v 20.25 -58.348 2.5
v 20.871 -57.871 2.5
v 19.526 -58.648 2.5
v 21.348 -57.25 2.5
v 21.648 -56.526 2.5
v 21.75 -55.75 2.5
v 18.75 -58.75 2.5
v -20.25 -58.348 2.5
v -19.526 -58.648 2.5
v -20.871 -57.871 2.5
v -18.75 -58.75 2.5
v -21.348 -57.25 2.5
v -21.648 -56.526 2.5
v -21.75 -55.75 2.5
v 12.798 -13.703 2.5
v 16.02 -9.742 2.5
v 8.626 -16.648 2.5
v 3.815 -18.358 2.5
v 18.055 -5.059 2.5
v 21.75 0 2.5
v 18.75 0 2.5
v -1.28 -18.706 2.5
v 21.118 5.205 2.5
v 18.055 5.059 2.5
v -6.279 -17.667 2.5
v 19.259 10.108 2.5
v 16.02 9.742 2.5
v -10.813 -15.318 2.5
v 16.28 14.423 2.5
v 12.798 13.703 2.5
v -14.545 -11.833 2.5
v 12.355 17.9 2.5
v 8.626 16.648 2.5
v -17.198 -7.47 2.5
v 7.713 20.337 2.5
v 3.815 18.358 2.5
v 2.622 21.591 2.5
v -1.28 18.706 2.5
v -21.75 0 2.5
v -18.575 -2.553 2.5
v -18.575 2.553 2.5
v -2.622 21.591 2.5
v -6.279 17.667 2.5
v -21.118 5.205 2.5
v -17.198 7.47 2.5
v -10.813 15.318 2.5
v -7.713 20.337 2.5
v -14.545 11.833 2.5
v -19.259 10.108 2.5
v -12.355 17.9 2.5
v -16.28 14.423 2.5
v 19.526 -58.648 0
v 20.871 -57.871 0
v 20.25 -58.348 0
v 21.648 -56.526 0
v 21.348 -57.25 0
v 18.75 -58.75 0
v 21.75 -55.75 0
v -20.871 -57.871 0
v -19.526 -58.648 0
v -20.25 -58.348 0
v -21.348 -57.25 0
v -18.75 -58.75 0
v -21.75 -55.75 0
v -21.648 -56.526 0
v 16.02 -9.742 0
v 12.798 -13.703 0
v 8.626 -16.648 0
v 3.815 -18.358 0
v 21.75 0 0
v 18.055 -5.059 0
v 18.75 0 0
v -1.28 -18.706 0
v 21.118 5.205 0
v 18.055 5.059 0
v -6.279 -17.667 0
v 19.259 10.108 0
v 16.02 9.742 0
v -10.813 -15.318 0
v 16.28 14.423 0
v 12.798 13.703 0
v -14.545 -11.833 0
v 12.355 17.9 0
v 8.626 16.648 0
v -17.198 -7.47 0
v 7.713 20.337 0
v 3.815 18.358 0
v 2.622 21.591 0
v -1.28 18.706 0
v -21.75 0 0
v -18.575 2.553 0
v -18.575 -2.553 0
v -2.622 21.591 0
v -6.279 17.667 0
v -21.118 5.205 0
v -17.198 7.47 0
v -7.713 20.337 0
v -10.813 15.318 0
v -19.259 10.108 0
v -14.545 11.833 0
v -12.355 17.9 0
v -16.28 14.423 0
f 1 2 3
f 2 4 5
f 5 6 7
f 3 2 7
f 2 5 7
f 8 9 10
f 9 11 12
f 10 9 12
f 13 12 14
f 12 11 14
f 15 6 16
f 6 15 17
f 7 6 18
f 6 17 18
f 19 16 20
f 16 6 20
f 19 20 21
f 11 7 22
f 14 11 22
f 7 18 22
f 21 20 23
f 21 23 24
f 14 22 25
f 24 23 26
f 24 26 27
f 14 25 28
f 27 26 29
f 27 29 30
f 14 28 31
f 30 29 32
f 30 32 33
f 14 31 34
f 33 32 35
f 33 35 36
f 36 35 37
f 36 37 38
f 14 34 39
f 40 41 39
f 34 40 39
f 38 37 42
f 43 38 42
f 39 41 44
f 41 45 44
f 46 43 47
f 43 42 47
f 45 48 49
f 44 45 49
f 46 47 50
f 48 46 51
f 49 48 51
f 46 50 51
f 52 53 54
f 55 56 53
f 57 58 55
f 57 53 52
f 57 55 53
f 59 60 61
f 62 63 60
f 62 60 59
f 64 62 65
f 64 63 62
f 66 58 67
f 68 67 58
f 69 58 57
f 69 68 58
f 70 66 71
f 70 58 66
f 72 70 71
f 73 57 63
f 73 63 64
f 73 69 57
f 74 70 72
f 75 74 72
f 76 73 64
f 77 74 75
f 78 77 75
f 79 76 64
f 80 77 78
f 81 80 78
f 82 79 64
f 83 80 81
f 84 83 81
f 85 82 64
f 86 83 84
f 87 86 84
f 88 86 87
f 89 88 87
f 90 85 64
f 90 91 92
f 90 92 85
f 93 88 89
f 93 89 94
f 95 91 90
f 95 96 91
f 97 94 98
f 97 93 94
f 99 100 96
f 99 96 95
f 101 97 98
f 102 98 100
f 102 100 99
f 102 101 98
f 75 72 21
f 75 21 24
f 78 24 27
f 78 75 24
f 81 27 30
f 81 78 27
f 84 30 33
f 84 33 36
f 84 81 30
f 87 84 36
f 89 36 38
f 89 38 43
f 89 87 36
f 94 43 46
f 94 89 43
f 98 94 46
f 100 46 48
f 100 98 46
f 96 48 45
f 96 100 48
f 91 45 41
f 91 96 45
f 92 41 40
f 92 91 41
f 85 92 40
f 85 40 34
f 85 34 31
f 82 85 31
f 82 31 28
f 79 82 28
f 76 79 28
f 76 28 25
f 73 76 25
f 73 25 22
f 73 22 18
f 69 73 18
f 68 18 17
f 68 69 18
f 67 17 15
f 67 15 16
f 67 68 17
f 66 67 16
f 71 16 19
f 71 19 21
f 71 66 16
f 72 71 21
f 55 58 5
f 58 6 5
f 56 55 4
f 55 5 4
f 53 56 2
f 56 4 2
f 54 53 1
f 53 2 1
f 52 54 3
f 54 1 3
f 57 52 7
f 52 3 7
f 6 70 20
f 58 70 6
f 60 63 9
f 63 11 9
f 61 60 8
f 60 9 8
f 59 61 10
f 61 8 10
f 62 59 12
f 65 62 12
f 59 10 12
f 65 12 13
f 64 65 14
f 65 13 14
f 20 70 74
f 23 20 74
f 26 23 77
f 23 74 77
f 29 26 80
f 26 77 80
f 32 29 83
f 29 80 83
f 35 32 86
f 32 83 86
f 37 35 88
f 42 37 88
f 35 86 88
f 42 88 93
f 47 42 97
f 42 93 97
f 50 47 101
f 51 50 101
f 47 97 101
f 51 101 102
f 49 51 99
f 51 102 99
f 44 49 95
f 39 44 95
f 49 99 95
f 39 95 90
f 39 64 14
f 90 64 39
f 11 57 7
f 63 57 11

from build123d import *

# Parameters (mm, degrees)
SKETCH_R  = 18.75
PAD_DEPTH = 2.5
FILLET_R  = 3


with BuildPart() as part:
    # Sketch → Pad (new body)
    with BuildSketch(Plane.XY):
        with BuildLine():
            Line((21.75, 0), (21.75, -58.75))
            Line((21.75, -58.75), (-21.75, -58.75))
            Line((-21.75, -58.75), (-21.75, 0))
            ThreePointArc((21.75, 0), (0, 21.75), (-21.75, 0))
        make_face()
        Circle(SKETCH_R, mode=Mode.SUBTRACT)
    extrude(amount=PAD_DEPTH)

    # Fillet
    fillet_edges = [part.edges().sort_by_distance(p)[0] for p in [
        (-21.75, -58.75, 1.25),
        (21.75, -58.75, 1.25),
    ]]
    fillet(fillet_edges, radius=FILLET_R)


solid = part.part
